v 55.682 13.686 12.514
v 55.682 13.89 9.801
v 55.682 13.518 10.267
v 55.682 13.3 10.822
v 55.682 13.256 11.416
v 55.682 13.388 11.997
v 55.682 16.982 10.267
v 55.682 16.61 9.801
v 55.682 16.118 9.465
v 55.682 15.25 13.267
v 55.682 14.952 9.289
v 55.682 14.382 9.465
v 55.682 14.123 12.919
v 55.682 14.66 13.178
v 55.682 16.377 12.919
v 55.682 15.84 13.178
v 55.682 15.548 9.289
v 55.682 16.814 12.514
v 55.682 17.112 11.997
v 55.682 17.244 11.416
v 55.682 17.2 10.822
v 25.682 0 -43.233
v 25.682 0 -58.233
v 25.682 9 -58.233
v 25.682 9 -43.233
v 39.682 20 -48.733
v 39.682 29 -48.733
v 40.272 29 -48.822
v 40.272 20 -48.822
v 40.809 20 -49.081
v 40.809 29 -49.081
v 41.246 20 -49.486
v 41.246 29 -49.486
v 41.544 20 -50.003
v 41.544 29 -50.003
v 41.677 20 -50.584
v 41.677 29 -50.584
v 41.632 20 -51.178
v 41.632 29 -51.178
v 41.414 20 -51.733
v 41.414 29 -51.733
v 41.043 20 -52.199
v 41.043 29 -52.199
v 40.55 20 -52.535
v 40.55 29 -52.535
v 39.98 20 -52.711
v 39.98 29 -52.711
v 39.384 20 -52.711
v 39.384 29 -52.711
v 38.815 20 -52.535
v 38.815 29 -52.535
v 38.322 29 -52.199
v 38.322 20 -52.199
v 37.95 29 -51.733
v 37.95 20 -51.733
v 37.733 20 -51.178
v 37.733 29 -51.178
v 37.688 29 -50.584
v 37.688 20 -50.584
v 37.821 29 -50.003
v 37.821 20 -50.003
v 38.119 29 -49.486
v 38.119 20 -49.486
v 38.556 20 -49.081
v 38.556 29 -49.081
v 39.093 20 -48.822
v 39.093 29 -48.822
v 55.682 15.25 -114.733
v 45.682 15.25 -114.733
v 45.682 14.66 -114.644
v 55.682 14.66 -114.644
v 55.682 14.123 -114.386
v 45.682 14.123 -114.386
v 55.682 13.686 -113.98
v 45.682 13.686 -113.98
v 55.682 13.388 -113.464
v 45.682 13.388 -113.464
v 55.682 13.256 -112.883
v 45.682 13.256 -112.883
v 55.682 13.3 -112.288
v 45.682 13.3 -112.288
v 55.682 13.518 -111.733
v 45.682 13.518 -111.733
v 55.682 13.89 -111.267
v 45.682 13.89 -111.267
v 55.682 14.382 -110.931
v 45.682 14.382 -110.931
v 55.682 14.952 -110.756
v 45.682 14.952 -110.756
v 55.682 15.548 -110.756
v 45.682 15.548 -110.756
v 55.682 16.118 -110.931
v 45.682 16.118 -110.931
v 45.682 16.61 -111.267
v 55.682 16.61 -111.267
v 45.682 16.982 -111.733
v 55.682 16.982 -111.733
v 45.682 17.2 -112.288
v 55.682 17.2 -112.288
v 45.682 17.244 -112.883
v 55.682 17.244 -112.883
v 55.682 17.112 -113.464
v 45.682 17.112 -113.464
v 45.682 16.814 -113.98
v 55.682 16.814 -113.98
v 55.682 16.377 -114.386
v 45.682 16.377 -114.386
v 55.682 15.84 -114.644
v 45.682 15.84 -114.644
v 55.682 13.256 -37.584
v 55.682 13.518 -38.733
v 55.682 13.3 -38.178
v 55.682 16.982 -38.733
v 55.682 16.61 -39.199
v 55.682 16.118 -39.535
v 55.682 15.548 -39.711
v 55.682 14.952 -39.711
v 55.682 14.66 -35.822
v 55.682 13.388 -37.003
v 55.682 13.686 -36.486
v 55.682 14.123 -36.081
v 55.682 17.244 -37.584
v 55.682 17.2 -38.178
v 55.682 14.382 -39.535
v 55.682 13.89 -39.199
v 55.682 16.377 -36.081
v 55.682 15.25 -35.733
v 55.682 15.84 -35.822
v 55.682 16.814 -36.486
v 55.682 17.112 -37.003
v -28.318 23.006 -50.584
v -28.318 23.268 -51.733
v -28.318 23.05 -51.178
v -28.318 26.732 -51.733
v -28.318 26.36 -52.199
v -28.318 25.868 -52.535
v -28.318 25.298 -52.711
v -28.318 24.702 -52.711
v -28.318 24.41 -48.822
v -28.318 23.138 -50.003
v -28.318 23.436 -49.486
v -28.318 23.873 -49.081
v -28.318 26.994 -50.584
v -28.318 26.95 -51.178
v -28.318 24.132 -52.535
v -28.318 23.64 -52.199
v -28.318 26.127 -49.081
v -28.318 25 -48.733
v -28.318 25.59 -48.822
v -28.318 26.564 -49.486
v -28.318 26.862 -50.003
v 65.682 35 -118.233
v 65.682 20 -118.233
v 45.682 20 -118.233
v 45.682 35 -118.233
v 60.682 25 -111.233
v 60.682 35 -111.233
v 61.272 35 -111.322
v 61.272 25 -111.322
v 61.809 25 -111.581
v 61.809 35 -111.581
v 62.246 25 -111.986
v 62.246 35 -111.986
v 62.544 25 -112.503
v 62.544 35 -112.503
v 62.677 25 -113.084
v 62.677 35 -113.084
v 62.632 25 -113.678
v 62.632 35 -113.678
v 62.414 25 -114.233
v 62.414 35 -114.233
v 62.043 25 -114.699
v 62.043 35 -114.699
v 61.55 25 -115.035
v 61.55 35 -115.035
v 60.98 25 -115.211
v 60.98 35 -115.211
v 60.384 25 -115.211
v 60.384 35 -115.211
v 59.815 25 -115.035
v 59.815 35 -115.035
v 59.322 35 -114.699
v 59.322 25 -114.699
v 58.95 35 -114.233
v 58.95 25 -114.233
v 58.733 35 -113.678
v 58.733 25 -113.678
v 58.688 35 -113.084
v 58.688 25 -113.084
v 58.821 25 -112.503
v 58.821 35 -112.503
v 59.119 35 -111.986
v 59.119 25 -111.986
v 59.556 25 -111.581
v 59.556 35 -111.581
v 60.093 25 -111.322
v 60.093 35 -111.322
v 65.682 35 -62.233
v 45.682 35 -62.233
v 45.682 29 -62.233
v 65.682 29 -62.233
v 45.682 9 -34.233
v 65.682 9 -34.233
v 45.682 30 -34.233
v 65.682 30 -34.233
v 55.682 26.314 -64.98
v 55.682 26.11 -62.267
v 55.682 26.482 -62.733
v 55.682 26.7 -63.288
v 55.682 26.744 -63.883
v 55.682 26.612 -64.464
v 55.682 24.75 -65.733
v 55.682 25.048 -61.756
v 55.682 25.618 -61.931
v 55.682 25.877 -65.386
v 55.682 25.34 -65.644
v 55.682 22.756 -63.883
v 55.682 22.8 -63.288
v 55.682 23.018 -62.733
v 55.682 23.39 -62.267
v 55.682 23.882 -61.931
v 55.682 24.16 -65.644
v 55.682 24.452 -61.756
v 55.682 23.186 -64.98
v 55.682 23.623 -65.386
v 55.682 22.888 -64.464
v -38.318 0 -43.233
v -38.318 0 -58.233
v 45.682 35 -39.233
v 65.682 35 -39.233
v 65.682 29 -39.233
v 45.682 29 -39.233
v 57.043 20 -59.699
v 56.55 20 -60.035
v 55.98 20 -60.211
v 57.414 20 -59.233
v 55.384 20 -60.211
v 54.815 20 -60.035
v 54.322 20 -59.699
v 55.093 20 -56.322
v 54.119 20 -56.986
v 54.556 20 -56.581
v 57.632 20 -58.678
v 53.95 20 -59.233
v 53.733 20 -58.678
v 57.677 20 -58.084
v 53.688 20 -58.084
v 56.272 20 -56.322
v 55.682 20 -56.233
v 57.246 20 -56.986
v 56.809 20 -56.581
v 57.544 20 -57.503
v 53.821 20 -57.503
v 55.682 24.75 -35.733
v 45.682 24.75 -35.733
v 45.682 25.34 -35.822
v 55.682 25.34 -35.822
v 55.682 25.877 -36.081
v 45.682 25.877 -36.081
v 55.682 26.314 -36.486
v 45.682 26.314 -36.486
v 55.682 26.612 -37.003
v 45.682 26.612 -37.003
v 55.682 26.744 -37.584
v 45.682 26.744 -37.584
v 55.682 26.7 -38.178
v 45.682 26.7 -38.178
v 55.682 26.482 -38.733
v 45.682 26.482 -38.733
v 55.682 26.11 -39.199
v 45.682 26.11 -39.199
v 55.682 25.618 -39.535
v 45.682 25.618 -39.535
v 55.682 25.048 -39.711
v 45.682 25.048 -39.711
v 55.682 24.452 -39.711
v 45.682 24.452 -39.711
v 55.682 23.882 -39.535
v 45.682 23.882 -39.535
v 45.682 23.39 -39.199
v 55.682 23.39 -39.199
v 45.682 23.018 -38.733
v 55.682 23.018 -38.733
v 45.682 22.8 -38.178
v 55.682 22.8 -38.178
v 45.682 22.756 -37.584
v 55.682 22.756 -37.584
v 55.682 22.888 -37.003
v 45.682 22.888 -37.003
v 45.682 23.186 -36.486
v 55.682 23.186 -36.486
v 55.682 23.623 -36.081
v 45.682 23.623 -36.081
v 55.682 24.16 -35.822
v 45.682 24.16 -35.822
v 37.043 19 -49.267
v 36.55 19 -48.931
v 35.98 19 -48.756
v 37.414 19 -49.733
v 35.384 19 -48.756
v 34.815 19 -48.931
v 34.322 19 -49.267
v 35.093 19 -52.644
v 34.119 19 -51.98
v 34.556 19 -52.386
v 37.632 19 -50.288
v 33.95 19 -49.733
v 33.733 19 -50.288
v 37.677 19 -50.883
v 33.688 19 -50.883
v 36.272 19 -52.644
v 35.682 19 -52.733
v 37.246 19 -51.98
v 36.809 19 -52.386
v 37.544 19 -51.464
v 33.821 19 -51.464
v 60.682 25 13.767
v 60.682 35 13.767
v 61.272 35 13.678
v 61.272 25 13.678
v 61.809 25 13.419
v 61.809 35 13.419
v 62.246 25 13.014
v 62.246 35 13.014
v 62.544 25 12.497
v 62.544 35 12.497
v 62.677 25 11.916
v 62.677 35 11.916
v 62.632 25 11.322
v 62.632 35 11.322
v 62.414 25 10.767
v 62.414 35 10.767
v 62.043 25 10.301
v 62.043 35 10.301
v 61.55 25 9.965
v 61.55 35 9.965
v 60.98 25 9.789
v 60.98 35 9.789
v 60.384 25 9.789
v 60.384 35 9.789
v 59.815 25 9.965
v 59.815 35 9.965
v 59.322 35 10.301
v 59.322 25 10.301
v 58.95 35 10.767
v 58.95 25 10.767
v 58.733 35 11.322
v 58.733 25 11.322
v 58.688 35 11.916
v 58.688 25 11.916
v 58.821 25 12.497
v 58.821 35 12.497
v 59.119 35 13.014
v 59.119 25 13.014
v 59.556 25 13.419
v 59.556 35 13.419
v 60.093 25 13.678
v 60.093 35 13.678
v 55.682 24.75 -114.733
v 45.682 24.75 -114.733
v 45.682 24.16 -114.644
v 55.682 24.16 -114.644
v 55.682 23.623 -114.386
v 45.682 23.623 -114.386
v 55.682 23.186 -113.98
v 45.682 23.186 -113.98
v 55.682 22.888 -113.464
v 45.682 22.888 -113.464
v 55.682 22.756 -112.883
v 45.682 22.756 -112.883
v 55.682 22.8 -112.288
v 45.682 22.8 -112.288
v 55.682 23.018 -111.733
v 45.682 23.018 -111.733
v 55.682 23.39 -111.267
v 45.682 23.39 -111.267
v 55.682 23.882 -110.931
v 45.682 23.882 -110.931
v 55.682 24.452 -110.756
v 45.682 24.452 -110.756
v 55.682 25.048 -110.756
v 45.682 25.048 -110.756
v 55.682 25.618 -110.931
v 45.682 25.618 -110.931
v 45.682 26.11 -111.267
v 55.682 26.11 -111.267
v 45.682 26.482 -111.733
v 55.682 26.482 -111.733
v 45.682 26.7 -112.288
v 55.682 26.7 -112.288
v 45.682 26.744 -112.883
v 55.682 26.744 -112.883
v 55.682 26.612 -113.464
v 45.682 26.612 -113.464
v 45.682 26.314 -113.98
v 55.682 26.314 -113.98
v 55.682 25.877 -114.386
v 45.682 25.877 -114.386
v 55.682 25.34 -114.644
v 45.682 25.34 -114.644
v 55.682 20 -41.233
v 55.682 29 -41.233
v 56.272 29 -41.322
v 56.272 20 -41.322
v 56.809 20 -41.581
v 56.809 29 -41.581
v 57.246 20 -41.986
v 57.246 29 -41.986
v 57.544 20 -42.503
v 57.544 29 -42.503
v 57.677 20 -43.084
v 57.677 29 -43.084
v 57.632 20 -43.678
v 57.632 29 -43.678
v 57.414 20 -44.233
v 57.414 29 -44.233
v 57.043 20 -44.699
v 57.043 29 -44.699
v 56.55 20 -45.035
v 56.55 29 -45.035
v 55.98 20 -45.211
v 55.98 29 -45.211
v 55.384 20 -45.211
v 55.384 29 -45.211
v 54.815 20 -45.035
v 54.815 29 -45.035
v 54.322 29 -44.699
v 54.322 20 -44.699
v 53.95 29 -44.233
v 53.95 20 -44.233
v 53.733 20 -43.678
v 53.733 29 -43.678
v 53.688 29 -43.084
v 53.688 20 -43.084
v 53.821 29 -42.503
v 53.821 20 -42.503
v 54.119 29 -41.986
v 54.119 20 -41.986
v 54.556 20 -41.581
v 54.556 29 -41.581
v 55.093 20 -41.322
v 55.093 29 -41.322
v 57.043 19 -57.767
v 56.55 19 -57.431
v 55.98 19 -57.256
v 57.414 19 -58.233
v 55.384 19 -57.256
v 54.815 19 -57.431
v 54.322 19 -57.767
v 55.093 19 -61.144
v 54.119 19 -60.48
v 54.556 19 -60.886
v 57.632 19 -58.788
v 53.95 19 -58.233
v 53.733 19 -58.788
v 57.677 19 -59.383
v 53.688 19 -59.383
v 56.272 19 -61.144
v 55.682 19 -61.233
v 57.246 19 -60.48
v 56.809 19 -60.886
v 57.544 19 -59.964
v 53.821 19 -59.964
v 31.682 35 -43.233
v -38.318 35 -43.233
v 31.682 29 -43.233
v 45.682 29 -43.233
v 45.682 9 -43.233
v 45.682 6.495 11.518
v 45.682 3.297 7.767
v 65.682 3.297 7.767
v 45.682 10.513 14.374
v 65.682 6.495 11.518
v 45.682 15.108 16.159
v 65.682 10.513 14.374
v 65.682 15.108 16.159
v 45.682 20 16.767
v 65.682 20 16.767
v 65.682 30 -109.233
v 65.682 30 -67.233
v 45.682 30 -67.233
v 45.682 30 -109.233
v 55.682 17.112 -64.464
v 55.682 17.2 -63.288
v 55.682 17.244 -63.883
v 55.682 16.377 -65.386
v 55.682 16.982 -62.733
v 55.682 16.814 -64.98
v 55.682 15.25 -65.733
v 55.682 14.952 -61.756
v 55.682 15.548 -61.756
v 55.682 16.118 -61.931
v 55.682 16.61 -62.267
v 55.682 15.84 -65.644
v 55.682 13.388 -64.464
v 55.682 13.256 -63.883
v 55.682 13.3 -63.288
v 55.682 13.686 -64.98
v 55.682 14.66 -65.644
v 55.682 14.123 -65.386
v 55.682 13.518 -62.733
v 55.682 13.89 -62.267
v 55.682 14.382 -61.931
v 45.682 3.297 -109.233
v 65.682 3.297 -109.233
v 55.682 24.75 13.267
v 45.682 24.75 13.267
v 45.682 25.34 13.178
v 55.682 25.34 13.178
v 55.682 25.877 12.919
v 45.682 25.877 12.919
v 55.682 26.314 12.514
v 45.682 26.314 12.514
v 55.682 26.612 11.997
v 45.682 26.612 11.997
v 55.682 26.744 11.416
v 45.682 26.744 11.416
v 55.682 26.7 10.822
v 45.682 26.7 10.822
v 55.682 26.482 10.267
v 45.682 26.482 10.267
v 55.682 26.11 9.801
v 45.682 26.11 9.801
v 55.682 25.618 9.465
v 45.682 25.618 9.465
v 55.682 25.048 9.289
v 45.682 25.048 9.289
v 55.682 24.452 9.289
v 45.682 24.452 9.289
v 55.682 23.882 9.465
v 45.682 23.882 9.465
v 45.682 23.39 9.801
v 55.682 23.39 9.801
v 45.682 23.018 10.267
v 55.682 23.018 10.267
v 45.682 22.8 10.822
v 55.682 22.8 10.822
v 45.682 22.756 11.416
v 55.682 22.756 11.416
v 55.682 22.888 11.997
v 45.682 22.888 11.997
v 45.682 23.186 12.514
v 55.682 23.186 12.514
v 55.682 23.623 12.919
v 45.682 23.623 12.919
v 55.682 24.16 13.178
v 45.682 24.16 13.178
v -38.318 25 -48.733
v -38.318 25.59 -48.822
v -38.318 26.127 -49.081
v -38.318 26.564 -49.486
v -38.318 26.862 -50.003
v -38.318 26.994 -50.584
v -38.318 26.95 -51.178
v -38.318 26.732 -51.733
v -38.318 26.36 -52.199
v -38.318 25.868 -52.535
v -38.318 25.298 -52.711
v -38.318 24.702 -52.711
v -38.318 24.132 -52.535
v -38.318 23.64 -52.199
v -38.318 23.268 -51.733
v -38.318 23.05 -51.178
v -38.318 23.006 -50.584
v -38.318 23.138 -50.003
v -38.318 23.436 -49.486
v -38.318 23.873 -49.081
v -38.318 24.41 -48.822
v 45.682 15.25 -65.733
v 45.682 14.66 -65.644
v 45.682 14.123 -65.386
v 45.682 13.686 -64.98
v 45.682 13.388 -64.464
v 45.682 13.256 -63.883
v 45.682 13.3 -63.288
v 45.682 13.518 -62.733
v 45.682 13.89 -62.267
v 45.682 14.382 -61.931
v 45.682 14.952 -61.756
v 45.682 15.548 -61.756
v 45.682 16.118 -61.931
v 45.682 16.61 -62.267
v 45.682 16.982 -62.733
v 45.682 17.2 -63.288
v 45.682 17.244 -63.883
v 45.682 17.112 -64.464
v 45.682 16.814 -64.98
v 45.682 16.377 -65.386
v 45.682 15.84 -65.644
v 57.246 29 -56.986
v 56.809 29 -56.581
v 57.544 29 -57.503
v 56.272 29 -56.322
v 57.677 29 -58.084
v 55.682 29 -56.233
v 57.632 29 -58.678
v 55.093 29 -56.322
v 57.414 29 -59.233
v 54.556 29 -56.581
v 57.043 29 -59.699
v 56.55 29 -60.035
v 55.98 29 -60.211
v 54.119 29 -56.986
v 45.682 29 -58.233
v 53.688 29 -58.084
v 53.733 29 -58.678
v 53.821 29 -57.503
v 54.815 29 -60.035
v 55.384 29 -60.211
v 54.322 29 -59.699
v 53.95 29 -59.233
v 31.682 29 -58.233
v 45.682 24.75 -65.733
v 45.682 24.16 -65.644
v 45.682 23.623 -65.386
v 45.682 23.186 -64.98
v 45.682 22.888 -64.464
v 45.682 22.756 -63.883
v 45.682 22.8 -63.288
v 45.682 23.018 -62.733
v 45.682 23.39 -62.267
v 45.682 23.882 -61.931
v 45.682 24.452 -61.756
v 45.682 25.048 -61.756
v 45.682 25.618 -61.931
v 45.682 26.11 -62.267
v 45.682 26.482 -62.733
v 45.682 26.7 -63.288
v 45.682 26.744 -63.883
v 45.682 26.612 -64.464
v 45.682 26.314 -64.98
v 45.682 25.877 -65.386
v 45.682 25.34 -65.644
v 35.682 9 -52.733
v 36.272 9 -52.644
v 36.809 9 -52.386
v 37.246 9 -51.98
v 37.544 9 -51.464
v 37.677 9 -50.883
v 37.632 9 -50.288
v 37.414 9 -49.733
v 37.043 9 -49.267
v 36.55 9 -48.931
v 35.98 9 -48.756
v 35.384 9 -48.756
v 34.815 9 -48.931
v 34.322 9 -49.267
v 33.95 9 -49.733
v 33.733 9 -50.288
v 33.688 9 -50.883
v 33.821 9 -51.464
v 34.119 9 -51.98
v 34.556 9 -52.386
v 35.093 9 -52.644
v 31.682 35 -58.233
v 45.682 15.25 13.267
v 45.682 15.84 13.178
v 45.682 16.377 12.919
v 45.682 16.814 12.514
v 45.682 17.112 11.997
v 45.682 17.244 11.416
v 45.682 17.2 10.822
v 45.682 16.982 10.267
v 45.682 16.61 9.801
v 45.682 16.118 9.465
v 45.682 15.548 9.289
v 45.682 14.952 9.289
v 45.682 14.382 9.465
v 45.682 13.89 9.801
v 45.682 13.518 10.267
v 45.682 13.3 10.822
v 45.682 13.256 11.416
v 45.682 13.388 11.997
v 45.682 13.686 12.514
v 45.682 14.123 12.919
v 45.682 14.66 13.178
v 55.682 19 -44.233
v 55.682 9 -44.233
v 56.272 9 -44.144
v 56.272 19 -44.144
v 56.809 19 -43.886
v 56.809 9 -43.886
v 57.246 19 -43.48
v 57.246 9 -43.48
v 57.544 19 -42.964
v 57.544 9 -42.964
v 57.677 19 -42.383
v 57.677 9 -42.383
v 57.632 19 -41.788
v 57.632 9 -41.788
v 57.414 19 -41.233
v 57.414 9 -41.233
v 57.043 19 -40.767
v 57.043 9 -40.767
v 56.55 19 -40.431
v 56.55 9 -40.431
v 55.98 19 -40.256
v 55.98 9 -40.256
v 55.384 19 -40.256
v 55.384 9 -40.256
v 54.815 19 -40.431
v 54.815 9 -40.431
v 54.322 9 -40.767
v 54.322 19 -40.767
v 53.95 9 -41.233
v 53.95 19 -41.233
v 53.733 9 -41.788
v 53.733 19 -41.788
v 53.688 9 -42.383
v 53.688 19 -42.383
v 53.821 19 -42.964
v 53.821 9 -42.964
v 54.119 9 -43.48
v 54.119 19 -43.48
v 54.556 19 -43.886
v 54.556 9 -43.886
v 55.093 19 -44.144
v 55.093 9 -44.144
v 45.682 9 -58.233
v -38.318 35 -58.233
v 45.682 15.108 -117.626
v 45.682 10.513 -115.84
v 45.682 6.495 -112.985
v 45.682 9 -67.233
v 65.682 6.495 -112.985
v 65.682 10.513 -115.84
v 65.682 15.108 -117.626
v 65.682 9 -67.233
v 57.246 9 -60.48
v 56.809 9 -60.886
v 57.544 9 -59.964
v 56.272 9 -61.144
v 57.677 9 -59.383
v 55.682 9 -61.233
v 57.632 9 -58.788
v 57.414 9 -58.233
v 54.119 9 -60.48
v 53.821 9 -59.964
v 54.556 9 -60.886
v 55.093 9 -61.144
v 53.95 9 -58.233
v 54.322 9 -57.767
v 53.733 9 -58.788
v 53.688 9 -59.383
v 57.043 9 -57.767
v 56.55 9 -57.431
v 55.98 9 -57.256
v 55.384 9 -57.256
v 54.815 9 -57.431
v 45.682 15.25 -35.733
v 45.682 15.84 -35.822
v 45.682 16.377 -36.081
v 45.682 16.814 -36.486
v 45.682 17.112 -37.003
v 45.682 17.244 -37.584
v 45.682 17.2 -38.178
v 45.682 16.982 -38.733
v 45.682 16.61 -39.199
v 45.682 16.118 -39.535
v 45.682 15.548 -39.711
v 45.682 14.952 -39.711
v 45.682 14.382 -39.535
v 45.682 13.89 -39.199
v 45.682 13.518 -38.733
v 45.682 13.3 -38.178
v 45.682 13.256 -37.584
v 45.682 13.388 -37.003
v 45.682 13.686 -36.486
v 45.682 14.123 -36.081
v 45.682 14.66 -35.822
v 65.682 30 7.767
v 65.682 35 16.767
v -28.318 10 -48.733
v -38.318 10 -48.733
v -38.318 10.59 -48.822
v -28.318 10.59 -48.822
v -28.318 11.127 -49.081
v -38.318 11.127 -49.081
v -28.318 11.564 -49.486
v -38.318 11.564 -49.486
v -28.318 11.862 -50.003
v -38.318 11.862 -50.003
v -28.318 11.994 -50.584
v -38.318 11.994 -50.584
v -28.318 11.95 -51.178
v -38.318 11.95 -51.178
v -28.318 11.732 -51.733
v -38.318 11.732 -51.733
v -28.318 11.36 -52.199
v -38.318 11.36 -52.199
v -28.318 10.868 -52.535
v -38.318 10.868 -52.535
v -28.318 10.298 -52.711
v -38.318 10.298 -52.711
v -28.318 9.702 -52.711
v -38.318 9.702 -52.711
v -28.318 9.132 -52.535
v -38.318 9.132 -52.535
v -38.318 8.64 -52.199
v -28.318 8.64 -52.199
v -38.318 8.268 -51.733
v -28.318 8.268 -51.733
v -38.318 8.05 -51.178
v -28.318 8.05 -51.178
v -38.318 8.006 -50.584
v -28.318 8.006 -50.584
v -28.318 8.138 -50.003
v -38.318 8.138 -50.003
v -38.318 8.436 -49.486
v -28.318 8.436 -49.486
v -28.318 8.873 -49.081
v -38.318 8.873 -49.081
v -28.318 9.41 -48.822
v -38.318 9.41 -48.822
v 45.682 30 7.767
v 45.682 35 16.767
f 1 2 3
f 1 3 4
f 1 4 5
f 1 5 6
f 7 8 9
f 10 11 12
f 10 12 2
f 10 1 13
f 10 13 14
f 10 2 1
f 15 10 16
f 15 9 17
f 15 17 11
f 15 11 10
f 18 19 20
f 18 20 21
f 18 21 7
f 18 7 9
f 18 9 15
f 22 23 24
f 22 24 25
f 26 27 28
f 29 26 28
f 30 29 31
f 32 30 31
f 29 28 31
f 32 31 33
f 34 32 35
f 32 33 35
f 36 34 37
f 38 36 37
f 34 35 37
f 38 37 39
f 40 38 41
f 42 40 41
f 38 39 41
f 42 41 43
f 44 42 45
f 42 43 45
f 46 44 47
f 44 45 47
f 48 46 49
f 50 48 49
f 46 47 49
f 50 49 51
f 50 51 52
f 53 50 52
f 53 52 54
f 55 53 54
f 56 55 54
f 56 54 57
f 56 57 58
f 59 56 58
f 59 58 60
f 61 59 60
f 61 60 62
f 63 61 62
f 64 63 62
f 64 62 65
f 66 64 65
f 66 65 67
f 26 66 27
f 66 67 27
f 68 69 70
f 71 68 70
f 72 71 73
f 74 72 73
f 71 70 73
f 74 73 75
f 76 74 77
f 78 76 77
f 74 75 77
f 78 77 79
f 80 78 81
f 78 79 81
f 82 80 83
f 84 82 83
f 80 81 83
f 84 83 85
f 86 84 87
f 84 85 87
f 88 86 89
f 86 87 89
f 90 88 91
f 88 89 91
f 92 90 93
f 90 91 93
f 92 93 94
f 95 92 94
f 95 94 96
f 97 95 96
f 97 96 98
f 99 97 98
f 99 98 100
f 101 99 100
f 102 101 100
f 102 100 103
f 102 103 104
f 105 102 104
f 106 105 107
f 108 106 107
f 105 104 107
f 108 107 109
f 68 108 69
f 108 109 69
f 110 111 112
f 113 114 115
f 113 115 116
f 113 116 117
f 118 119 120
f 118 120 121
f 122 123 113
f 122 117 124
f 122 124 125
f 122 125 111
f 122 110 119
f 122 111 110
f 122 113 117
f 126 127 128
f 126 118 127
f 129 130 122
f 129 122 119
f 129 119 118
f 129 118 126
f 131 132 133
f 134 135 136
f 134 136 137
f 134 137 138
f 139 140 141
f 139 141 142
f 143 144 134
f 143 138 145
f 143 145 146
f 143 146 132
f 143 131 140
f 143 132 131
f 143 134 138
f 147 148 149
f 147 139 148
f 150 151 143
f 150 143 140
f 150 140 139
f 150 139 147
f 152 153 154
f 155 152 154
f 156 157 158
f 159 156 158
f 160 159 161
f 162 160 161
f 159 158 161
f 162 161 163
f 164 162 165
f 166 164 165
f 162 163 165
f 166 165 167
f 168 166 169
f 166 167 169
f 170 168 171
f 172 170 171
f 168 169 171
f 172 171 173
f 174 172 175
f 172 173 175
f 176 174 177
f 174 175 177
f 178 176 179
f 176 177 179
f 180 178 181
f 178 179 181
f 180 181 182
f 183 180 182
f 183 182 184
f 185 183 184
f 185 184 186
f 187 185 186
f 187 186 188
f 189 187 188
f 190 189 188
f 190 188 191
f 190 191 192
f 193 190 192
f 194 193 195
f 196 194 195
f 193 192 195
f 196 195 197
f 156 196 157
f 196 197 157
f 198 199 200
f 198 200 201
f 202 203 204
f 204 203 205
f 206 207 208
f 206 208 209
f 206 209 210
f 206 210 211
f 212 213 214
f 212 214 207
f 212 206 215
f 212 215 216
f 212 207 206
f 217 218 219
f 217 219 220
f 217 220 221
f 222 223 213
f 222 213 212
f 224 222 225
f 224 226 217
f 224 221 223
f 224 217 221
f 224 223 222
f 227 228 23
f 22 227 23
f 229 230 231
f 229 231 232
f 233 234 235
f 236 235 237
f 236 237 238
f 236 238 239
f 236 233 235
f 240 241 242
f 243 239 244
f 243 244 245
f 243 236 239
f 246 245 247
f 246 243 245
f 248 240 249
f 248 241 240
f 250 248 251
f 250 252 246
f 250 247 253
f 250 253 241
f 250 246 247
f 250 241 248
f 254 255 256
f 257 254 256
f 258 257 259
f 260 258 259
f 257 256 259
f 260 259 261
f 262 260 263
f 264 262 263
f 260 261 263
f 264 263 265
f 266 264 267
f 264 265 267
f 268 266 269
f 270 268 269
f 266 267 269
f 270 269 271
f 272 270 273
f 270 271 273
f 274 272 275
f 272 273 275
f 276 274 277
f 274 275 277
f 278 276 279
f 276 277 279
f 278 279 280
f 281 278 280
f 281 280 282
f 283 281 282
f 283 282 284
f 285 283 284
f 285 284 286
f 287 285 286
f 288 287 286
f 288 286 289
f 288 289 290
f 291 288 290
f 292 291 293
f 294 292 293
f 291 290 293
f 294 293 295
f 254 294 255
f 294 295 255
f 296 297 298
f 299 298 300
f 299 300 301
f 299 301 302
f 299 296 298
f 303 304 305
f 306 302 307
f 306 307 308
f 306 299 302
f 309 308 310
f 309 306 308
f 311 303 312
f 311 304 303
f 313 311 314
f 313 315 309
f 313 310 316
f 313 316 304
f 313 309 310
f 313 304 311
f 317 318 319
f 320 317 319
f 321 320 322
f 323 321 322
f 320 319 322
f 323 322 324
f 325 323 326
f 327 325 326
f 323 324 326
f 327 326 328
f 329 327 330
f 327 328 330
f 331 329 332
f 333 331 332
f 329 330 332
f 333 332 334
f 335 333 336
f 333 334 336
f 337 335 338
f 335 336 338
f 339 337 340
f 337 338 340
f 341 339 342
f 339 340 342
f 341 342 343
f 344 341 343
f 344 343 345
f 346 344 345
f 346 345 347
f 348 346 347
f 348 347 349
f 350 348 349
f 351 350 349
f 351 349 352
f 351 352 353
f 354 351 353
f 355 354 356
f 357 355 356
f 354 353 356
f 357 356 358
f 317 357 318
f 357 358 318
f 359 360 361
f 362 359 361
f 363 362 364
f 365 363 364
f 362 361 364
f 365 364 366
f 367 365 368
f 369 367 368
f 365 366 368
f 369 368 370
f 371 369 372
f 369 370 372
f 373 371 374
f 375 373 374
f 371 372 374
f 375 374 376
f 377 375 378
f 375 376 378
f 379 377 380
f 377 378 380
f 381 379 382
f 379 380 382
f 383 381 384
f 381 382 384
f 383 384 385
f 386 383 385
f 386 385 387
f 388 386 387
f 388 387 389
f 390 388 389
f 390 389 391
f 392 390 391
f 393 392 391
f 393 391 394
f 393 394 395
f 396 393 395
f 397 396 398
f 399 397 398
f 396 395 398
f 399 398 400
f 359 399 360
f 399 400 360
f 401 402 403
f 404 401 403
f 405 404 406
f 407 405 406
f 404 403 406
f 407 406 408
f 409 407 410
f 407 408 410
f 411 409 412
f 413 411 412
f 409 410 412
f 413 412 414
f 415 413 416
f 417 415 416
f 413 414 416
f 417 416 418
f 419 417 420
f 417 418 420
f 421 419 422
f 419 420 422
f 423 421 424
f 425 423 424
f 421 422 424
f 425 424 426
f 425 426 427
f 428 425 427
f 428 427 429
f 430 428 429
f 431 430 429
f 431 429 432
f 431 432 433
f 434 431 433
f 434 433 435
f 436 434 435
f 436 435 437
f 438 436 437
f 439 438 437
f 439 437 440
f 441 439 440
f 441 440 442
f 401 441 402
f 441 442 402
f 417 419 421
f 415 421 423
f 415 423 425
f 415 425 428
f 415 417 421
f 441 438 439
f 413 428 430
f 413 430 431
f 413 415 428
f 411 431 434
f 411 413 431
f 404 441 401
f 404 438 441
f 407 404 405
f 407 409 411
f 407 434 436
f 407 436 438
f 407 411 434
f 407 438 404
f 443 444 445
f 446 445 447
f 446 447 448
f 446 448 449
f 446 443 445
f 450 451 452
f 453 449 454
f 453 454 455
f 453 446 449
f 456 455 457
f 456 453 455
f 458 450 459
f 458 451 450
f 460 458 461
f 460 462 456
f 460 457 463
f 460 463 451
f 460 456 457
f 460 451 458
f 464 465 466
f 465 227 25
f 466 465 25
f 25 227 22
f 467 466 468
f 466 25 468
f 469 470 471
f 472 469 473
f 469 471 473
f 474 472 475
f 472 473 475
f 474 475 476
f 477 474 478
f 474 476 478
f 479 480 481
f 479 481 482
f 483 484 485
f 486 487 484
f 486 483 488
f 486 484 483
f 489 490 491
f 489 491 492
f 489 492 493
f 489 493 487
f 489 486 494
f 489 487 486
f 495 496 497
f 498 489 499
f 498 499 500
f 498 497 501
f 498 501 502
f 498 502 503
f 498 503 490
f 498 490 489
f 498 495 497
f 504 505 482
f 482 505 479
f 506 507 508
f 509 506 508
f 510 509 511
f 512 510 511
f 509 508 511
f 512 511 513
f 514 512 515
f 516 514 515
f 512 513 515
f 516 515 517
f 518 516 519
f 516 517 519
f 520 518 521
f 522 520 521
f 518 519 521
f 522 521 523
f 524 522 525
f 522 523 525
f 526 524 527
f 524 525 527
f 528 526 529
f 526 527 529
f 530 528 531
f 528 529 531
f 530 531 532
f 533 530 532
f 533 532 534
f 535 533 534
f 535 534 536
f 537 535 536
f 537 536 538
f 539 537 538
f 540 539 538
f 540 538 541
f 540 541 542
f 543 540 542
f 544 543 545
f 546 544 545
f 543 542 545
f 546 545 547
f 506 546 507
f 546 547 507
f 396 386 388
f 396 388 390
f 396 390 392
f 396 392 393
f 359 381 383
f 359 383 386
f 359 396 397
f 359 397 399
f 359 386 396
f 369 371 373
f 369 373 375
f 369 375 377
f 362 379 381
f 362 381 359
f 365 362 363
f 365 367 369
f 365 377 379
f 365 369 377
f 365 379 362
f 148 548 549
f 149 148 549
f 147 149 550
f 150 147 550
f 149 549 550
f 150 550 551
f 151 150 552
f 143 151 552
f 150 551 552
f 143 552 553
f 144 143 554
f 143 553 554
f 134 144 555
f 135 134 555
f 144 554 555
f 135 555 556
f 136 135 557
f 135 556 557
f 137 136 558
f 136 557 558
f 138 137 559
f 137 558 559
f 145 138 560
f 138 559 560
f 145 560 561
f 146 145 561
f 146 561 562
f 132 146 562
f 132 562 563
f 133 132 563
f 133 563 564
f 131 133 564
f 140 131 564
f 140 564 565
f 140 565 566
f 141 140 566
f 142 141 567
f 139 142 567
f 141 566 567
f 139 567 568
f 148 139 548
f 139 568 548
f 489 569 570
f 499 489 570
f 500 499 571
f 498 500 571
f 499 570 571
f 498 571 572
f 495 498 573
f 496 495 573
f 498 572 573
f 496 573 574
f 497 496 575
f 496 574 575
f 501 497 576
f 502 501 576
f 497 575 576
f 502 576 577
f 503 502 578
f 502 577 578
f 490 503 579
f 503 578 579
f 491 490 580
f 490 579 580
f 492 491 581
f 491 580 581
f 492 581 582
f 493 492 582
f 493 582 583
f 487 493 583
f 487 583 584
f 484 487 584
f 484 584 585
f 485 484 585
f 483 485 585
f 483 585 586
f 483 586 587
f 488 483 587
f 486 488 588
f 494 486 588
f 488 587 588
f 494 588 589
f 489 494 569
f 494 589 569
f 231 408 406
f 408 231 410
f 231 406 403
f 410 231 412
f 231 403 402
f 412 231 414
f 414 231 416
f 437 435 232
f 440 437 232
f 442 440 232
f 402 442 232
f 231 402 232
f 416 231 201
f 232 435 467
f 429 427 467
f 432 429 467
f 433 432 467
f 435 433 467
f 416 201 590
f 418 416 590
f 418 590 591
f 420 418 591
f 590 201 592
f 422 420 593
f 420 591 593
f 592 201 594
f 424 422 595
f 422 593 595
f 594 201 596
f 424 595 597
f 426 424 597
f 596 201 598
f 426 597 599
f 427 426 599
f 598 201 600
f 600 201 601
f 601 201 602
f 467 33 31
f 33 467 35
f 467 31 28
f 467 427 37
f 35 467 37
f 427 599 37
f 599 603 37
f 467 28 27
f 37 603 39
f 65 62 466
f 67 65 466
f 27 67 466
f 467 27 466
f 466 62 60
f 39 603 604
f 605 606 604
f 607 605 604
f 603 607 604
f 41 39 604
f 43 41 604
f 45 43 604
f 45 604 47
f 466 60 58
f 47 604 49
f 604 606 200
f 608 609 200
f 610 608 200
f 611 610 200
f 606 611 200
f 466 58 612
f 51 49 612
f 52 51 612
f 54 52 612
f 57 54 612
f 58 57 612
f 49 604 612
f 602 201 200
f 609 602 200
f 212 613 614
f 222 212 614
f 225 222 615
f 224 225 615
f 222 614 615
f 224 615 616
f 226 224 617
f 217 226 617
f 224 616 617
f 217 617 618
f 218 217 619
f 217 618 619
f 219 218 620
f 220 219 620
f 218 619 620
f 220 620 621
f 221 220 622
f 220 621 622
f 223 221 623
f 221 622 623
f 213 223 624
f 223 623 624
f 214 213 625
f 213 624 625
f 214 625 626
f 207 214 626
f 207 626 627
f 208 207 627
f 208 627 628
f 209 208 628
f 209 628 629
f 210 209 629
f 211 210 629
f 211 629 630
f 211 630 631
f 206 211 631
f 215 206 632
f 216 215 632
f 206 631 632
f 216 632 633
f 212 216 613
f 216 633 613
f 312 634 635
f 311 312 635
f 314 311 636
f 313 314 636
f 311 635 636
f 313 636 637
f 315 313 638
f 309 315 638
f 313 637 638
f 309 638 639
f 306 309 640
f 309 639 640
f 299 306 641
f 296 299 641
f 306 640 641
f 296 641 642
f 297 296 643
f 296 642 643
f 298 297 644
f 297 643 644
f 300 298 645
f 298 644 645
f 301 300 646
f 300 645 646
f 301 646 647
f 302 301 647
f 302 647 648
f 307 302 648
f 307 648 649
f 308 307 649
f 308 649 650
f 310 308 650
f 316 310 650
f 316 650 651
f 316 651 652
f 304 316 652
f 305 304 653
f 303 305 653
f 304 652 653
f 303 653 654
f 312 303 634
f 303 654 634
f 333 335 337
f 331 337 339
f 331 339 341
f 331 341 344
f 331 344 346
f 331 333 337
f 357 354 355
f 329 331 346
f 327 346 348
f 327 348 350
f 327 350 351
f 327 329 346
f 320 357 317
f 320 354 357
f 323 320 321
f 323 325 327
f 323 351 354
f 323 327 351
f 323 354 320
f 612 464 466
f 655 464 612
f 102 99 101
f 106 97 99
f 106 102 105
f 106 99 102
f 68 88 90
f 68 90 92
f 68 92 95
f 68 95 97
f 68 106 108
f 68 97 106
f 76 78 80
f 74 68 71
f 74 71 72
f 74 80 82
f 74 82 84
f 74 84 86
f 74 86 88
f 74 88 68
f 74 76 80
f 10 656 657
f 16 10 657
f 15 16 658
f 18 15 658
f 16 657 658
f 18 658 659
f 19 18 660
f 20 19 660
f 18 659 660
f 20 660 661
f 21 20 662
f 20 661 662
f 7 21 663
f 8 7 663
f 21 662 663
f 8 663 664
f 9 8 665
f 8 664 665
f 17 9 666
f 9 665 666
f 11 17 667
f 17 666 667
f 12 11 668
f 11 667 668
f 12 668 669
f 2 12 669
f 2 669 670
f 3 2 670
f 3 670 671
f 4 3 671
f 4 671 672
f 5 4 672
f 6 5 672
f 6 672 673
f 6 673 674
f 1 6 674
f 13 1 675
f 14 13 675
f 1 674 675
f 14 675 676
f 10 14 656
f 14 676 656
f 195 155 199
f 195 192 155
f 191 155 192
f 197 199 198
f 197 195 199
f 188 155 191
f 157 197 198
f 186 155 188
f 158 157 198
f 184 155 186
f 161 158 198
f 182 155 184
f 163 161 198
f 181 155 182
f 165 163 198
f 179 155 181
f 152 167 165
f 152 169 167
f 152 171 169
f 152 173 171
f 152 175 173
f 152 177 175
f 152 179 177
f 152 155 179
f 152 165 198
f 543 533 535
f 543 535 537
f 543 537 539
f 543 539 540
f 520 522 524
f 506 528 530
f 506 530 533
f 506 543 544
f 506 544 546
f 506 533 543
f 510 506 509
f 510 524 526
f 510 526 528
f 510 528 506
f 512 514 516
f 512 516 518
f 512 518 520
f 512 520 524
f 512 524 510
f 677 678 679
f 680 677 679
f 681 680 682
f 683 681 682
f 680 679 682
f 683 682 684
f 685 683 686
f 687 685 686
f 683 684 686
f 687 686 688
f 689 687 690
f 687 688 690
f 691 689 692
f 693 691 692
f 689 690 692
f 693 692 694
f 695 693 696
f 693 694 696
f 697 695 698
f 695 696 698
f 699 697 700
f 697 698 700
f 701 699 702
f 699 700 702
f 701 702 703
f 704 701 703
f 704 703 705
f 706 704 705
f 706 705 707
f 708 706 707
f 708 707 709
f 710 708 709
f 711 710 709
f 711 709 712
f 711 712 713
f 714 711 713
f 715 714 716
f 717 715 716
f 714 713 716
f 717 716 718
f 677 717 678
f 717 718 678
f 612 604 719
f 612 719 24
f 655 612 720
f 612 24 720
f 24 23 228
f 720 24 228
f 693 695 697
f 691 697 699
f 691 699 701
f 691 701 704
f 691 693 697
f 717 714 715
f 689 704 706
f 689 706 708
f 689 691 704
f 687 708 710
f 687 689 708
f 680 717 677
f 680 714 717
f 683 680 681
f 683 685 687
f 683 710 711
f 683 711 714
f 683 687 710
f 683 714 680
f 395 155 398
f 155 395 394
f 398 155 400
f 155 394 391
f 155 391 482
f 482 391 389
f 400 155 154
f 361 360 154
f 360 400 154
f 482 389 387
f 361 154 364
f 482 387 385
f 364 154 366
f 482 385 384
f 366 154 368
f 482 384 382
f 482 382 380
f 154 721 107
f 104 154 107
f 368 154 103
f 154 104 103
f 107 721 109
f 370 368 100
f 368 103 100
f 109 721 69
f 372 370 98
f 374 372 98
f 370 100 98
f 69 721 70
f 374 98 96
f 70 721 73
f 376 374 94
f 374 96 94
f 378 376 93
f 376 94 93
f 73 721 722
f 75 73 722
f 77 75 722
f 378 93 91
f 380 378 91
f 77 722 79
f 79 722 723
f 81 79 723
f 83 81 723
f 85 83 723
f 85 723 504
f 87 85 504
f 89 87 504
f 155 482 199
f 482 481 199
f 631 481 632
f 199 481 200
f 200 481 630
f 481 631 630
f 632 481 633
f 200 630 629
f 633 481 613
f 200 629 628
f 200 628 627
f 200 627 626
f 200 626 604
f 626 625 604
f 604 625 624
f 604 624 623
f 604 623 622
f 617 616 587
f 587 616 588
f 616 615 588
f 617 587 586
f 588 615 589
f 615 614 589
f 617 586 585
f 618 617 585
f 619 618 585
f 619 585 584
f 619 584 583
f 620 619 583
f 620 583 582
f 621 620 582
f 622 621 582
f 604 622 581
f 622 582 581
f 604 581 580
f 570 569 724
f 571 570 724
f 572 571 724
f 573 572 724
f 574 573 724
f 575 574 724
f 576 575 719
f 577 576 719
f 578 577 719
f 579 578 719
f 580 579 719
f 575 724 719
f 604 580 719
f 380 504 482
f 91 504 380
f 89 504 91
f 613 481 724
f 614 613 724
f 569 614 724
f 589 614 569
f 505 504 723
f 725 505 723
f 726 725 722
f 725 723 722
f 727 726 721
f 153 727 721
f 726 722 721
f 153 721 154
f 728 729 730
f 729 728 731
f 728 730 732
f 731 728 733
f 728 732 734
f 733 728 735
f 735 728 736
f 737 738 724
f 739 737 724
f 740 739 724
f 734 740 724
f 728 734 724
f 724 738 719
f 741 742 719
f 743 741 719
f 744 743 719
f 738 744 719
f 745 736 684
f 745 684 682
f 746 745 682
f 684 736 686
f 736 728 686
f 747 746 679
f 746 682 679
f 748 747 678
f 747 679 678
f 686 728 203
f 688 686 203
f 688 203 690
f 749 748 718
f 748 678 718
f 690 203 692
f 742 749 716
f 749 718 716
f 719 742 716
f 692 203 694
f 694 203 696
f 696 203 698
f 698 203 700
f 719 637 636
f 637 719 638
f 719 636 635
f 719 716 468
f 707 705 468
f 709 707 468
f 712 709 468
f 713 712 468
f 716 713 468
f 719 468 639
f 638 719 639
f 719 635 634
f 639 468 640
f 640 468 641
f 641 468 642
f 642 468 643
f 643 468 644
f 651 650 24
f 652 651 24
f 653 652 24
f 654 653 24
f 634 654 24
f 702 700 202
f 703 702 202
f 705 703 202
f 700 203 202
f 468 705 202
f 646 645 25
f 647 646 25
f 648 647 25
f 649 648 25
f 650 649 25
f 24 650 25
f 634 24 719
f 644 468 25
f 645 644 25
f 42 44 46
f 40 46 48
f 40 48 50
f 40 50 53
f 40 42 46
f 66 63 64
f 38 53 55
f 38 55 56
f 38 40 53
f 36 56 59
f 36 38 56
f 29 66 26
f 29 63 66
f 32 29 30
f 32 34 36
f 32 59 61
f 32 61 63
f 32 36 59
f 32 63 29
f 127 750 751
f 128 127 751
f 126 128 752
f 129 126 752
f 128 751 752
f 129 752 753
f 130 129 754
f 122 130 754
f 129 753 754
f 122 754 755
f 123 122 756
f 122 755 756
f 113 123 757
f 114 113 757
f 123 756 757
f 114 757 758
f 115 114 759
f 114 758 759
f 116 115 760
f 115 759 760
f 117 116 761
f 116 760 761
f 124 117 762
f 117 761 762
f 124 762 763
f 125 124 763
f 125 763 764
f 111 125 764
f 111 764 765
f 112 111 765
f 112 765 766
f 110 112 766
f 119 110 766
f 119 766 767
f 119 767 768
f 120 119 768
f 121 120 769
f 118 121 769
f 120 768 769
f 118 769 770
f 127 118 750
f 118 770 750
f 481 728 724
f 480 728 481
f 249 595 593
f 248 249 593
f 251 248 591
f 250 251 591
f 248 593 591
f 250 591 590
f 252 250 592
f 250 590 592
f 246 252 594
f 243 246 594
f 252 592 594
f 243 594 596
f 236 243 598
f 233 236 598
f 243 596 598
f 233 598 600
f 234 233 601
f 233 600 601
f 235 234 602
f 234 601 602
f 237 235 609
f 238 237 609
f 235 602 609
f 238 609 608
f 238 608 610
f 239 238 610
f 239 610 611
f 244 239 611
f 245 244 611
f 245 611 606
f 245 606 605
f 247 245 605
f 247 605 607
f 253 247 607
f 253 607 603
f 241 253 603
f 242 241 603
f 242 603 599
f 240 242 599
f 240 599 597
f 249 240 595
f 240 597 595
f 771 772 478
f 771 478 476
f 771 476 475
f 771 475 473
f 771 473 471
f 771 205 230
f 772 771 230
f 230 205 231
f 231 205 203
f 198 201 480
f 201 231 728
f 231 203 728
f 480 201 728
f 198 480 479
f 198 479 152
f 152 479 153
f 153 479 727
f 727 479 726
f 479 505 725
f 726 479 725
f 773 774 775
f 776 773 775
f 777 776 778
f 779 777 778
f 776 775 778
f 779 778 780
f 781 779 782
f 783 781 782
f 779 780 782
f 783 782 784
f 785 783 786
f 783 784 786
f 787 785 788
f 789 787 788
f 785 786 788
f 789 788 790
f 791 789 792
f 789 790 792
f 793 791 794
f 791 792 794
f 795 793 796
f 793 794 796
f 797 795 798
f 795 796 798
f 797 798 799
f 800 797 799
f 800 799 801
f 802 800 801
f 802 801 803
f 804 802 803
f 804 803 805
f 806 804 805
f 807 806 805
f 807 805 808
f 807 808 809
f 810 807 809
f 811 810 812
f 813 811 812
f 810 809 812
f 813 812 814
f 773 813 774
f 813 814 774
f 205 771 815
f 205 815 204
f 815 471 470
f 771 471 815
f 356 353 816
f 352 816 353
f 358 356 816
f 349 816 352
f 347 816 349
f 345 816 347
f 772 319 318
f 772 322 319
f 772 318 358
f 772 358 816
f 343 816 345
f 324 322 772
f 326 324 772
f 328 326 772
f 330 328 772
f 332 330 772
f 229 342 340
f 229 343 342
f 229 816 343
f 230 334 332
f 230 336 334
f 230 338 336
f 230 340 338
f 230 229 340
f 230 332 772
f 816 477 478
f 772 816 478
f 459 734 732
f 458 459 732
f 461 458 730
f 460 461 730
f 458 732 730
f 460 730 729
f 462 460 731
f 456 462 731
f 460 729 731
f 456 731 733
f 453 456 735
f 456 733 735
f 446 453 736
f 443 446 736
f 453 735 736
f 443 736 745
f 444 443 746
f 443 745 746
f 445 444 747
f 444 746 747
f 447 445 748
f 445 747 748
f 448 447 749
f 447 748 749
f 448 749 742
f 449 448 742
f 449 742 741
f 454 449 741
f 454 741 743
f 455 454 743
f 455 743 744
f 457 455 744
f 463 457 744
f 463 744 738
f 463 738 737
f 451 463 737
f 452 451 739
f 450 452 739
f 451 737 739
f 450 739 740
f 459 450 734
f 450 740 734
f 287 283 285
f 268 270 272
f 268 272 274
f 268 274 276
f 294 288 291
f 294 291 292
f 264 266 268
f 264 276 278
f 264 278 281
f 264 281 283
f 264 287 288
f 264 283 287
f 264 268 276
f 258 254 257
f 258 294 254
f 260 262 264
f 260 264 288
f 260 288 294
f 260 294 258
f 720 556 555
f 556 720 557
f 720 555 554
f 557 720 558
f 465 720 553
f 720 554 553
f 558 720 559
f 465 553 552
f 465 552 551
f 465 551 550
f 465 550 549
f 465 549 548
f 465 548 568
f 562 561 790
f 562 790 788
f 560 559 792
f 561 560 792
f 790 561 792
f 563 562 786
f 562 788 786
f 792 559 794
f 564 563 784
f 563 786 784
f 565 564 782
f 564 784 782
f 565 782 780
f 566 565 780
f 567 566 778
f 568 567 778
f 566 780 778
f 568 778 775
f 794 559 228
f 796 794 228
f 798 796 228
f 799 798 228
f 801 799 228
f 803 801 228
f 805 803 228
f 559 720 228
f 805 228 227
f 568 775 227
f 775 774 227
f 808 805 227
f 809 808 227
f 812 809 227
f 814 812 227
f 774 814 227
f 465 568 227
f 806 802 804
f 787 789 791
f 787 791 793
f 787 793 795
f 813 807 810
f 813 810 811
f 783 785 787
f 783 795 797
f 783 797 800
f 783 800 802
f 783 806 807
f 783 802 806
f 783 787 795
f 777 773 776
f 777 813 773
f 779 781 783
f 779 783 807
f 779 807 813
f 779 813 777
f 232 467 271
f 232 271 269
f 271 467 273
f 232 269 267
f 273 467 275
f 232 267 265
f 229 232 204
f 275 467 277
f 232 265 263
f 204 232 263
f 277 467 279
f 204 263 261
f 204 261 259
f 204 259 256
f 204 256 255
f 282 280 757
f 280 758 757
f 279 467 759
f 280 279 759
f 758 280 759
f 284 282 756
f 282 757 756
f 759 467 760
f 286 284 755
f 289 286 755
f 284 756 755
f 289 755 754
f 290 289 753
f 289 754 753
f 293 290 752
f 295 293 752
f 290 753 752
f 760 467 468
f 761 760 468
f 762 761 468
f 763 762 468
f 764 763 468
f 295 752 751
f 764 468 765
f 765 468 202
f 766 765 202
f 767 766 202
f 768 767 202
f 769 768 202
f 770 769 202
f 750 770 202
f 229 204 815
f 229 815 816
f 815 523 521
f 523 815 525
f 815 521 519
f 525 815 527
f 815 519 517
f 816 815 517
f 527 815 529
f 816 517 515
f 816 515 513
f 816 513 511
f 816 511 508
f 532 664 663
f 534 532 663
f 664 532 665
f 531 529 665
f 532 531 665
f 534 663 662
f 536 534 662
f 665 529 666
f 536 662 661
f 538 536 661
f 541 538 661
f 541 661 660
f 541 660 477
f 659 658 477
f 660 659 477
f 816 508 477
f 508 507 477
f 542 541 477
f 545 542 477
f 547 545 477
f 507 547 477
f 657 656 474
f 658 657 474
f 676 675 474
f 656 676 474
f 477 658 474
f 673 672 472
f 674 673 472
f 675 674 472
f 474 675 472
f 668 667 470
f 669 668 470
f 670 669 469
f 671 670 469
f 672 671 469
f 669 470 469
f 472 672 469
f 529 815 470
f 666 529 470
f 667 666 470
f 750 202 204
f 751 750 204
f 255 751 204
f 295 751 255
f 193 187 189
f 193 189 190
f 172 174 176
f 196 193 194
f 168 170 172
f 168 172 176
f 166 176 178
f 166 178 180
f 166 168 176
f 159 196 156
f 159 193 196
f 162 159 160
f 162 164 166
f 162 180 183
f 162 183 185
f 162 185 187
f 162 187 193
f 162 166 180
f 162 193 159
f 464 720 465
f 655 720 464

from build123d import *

# Parameters (mm, degrees)
BOSS_EXTRUDE1_DEPTH = 35
CUT_EXTRUDE1_REACH  = 163.307
SKETCH2_W           = 42
SKETCH2_H           = 21
SKETCH3_R           = 2
CUT_EXTRUDE2_DEPTH  = 10
FILLET1_R           = 20
CUT_EXTRUDE5_REACH  = 163.307
SKETCH6_W           = 42
SKETCH6_H           = 9
SKETCH7_R           = 2
CUT_EXTRUDE6_DEPTH  = 10
CUT_EXTRUDE7_DEPTH  = 9
SKETCH9_R           = 2
CUT_EXTRUDE8_DEPTH  = 10
CUT_EXTRUDE9_DEPTH  = 6
SKETCH11_R          = 2
CUT_EXTRUDE10_DEPTH = 9
SKETCH12_R          = 2
CUT_EXTRUDE11_DEPTH = 10


with BuildPart() as part:
    # Sketch1 → Boss-Extrude1 (new body)
    with BuildSketch(Plane(origin=(0, 0, 0), x_dir=(1, 0, 0), z_dir=(0, 1, 0))):
        Polygon((-38.317617866, 43.23325062), (45.682382134, 43.23325062), (45.682382134, -16.76674938), (65.682382134, -16.76674938), (65.682382134, 118.23325062), (45.682382134, 118.23325062), (45.682382134, 58.23325062), (-38.317617866, 58.23325062), align=None)
    extrude(amount=BOSS_EXTRUDE1_DEPTH)

    # Sketch2 → Cut-Extrude1 (cut, up to next)
    with BuildSketch(Plane(origin=(65.682382134, 0, 0), x_dir=(0, 0, -1), z_dir=(1, 0, 0)), mode=Mode.PRIVATE) as cut_extrude1_sk1:
        with Locations((13.23325062, 19.5)):
            Rectangle(SKETCH2_W, SKETCH2_H)
    cut_extrude1_tool1 = extrude(cut_extrude1_sk1.sketch, amount=-CUT_EXTRUDE1_REACH, mode=Mode.PRIVATE) & part.part
    # Sketch2 → Cut-Extrude1 (cut, up to next)
    with BuildSketch(Plane(origin=(65.682382134, 0, 0), x_dir=(0, 0, -1), z_dir=(1, 0, 0)), mode=Mode.PRIVATE) as cut_extrude1_sk2:
        with Locations((88.23325062, 19.5)):
            Rectangle(SKETCH2_W, SKETCH2_H)
    cut_extrude1_tool2 = extrude(cut_extrude1_sk2.sketch, amount=-CUT_EXTRUDE1_REACH, mode=Mode.PRIVATE) & part.part
    add(cut_extrude1_tool1.solids().sort_by_distance((65.682382, 19.5, -13.233251))[0], mode=Mode.SUBTRACT)
    add(cut_extrude1_tool2.solids().sort_by_distance((65.682382, 19.5, -88.233251))[0], mode=Mode.SUBTRACT)

    # Sketch3 → Cut-Extrude2 (cut)
    with BuildSketch(Plane.ZY.offset(-45.682382134)):
        with Locations((11.26674938, 24.75)):
            Circle(SKETCH3_R)
        with Locations((11.26674938, 15.25)):
            Circle(SKETCH3_R)
        with Locations((-37.73325062, 24.75)):
            Circle(SKETCH3_R)
        with Locations((-37.73325062, 15.25)):
            Circle(SKETCH3_R)
        with Locations(Location((-112.73325062, 24.75, 0), (0, 0, 180))):
            Circle(SKETCH3_R)
        with Locations(Location((-112.73325062, 15.25, 0), (0, 0, 180))):
            Circle(SKETCH3_R)
        with Locations(Location((-63.73325062, 15.25, 0), (0, 0, 180))):
            Circle(SKETCH3_R)
        with Locations(Location((-63.73325062, 24.75, 0), (0, 0, 180))):
            Circle(SKETCH3_R)
    extrude(amount=-CUT_EXTRUDE2_DEPTH, mode=Mode.SUBTRACT)

    # Fillet1
    fillet1_edges = [part.edges().sort_by_distance(p)[0] for p in [
        (55.682382134, 0, -118.23325062),
        (55.682382134, 0, 16.76674938),
    ]]
    fillet(fillet1_edges, radius=FILLET1_R)

    # Sketch6 → Cut-Extrude5 (cut, up to next)
    with BuildSketch(Plane(origin=(65.682382134, 0, 0), x_dir=(0, 0, -1), z_dir=(1, 0, 0)), mode=Mode.PRIVATE) as cut_extrude5_sk1:
        with Locations((13.23325062, 4.5)):
            Rectangle(SKETCH6_W, SKETCH6_H)
    cut_extrude5_tool1 = extrude(cut_extrude5_sk1.sketch, amount=-CUT_EXTRUDE5_REACH, mode=Mode.PRIVATE) & part.part
    # Sketch6 → Cut-Extrude5 (cut, up to next)
    with BuildSketch(Plane(origin=(65.682382134, 0, 0), x_dir=(0, 0, -1), z_dir=(1, 0, 0)), mode=Mode.PRIVATE) as cut_extrude5_sk2:
        with Locations((88.23325062, 4.5)):
            Rectangle(SKETCH6_W, SKETCH6_H)
    cut_extrude5_tool2 = extrude(cut_extrude5_sk2.sketch, amount=-CUT_EXTRUDE5_REACH, mode=Mode.PRIVATE) & part.part
    add(cut_extrude5_tool1.solids().sort_by_distance((65.682382, 4.5, -13.233251))[0], mode=Mode.SUBTRACT)
    add(cut_extrude5_tool2.solids().sort_by_distance((65.682382, 4.5, -88.233251))[0], mode=Mode.SUBTRACT)

    # Sketch7 → Cut-Extrude6 (cut)
    with BuildSketch(Plane.ZY.offset(38.317617866)):
        with Locations((-50.73325062, 25)):
            Circle(SKETCH7_R)
        with Locations((-50.73325062, 10)):
            Circle(SKETCH7_R)
    extrude(amount=-CUT_EXTRUDE6_DEPTH, mode=Mode.SUBTRACT)

    # Sketch8 → Cut-Extrude7 (cut)
    with BuildSketch(Plane.XZ):
        Polygon((45.682382134, -67.23325062), (45.682382134, -58.23325062), (25.682382134, -58.23325062), (25.682382134, -43.23325062), (45.682382134, -43.23325062), (45.682382134, -34.23325062), (65.682382134, -34.23325062), (65.682382134, -67.23325062), align=None)
    extrude(amount=-CUT_EXTRUDE7_DEPTH, mode=Mode.SUBTRACT)

    # Sketch9 → Cut-Extrude8 (cut)
    with BuildSketch(Plane.XZ.offset(-9)):
        with Locations(Location((55.682382134, -42.23325062, 0), (0, 0, 270))):
            Circle(SKETCH9_R)
        with Locations(Location((55.682382134, -59.23325062, 0), (0, 0, 270))):
            Circle(SKETCH9_R)
        with Locations(Location((35.682382134, -50.73325062, 0), (0, 0, 270))):
            Circle(SKETCH9_R)
    extrude(amount=-CUT_EXTRUDE8_DEPTH, mode=Mode.SUBTRACT)

    # Sketch10 → Cut-Extrude9 (cut)
    with BuildSketch(Plane(origin=(0, 35, 0), x_dir=(1, 0, 0), z_dir=(0, 1, 0))):
        Polygon((45.682382134, 62.23325062), (65.682382134, 62.23325062), (65.682382134, 39.23325062), (45.682382134, 39.23325062), (45.682382134, 43.23325062), (31.682382134, 43.23325062), (31.682382134, 58.23325062), (45.682382134, 58.23325062), align=None)
    extrude(amount=-CUT_EXTRUDE9_DEPTH, mode=Mode.SUBTRACT)

    # Sketch11 → Cut-Extrude10 (cut)
    with BuildSketch(Plane(origin=(0, 29, 0), x_dir=(1, 0, 0), z_dir=(0, 1, 0))):
        with Locations(Location((55.682382134, 58.23325062, 0), (0, 0, 270))):
            Circle(SKETCH11_R)
        with Locations(Location((55.682382134, 43.23325062, 0), (0, 0, 270))):
            Circle(SKETCH11_R)
        with Locations(Location((39.682382134, 50.73325062, 0), (0, 0, 270))):
            Circle(SKETCH11_R)
    extrude(amount=-CUT_EXTRUDE10_DEPTH, mode=Mode.SUBTRACT)

    # Sketch12 → Cut-Extrude11 (cut)
    with BuildSketch(Plane(origin=(0, 35, 0), x_dir=(1, 0, 0), z_dir=(0, 1, 0))):
        with Locations(Location((60.682382134, -11.76674938, 0), (0, 0, 270))):
            Circle(SKETCH12_R)
        with Locations(Location((60.682382134, 113.23325062, 0), (0, 0, 270))):
            Circle(SKETCH12_R)
    extrude(amount=-CUT_EXTRUDE11_DEPTH, mode=Mode.SUBTRACT)


solid = part.part
